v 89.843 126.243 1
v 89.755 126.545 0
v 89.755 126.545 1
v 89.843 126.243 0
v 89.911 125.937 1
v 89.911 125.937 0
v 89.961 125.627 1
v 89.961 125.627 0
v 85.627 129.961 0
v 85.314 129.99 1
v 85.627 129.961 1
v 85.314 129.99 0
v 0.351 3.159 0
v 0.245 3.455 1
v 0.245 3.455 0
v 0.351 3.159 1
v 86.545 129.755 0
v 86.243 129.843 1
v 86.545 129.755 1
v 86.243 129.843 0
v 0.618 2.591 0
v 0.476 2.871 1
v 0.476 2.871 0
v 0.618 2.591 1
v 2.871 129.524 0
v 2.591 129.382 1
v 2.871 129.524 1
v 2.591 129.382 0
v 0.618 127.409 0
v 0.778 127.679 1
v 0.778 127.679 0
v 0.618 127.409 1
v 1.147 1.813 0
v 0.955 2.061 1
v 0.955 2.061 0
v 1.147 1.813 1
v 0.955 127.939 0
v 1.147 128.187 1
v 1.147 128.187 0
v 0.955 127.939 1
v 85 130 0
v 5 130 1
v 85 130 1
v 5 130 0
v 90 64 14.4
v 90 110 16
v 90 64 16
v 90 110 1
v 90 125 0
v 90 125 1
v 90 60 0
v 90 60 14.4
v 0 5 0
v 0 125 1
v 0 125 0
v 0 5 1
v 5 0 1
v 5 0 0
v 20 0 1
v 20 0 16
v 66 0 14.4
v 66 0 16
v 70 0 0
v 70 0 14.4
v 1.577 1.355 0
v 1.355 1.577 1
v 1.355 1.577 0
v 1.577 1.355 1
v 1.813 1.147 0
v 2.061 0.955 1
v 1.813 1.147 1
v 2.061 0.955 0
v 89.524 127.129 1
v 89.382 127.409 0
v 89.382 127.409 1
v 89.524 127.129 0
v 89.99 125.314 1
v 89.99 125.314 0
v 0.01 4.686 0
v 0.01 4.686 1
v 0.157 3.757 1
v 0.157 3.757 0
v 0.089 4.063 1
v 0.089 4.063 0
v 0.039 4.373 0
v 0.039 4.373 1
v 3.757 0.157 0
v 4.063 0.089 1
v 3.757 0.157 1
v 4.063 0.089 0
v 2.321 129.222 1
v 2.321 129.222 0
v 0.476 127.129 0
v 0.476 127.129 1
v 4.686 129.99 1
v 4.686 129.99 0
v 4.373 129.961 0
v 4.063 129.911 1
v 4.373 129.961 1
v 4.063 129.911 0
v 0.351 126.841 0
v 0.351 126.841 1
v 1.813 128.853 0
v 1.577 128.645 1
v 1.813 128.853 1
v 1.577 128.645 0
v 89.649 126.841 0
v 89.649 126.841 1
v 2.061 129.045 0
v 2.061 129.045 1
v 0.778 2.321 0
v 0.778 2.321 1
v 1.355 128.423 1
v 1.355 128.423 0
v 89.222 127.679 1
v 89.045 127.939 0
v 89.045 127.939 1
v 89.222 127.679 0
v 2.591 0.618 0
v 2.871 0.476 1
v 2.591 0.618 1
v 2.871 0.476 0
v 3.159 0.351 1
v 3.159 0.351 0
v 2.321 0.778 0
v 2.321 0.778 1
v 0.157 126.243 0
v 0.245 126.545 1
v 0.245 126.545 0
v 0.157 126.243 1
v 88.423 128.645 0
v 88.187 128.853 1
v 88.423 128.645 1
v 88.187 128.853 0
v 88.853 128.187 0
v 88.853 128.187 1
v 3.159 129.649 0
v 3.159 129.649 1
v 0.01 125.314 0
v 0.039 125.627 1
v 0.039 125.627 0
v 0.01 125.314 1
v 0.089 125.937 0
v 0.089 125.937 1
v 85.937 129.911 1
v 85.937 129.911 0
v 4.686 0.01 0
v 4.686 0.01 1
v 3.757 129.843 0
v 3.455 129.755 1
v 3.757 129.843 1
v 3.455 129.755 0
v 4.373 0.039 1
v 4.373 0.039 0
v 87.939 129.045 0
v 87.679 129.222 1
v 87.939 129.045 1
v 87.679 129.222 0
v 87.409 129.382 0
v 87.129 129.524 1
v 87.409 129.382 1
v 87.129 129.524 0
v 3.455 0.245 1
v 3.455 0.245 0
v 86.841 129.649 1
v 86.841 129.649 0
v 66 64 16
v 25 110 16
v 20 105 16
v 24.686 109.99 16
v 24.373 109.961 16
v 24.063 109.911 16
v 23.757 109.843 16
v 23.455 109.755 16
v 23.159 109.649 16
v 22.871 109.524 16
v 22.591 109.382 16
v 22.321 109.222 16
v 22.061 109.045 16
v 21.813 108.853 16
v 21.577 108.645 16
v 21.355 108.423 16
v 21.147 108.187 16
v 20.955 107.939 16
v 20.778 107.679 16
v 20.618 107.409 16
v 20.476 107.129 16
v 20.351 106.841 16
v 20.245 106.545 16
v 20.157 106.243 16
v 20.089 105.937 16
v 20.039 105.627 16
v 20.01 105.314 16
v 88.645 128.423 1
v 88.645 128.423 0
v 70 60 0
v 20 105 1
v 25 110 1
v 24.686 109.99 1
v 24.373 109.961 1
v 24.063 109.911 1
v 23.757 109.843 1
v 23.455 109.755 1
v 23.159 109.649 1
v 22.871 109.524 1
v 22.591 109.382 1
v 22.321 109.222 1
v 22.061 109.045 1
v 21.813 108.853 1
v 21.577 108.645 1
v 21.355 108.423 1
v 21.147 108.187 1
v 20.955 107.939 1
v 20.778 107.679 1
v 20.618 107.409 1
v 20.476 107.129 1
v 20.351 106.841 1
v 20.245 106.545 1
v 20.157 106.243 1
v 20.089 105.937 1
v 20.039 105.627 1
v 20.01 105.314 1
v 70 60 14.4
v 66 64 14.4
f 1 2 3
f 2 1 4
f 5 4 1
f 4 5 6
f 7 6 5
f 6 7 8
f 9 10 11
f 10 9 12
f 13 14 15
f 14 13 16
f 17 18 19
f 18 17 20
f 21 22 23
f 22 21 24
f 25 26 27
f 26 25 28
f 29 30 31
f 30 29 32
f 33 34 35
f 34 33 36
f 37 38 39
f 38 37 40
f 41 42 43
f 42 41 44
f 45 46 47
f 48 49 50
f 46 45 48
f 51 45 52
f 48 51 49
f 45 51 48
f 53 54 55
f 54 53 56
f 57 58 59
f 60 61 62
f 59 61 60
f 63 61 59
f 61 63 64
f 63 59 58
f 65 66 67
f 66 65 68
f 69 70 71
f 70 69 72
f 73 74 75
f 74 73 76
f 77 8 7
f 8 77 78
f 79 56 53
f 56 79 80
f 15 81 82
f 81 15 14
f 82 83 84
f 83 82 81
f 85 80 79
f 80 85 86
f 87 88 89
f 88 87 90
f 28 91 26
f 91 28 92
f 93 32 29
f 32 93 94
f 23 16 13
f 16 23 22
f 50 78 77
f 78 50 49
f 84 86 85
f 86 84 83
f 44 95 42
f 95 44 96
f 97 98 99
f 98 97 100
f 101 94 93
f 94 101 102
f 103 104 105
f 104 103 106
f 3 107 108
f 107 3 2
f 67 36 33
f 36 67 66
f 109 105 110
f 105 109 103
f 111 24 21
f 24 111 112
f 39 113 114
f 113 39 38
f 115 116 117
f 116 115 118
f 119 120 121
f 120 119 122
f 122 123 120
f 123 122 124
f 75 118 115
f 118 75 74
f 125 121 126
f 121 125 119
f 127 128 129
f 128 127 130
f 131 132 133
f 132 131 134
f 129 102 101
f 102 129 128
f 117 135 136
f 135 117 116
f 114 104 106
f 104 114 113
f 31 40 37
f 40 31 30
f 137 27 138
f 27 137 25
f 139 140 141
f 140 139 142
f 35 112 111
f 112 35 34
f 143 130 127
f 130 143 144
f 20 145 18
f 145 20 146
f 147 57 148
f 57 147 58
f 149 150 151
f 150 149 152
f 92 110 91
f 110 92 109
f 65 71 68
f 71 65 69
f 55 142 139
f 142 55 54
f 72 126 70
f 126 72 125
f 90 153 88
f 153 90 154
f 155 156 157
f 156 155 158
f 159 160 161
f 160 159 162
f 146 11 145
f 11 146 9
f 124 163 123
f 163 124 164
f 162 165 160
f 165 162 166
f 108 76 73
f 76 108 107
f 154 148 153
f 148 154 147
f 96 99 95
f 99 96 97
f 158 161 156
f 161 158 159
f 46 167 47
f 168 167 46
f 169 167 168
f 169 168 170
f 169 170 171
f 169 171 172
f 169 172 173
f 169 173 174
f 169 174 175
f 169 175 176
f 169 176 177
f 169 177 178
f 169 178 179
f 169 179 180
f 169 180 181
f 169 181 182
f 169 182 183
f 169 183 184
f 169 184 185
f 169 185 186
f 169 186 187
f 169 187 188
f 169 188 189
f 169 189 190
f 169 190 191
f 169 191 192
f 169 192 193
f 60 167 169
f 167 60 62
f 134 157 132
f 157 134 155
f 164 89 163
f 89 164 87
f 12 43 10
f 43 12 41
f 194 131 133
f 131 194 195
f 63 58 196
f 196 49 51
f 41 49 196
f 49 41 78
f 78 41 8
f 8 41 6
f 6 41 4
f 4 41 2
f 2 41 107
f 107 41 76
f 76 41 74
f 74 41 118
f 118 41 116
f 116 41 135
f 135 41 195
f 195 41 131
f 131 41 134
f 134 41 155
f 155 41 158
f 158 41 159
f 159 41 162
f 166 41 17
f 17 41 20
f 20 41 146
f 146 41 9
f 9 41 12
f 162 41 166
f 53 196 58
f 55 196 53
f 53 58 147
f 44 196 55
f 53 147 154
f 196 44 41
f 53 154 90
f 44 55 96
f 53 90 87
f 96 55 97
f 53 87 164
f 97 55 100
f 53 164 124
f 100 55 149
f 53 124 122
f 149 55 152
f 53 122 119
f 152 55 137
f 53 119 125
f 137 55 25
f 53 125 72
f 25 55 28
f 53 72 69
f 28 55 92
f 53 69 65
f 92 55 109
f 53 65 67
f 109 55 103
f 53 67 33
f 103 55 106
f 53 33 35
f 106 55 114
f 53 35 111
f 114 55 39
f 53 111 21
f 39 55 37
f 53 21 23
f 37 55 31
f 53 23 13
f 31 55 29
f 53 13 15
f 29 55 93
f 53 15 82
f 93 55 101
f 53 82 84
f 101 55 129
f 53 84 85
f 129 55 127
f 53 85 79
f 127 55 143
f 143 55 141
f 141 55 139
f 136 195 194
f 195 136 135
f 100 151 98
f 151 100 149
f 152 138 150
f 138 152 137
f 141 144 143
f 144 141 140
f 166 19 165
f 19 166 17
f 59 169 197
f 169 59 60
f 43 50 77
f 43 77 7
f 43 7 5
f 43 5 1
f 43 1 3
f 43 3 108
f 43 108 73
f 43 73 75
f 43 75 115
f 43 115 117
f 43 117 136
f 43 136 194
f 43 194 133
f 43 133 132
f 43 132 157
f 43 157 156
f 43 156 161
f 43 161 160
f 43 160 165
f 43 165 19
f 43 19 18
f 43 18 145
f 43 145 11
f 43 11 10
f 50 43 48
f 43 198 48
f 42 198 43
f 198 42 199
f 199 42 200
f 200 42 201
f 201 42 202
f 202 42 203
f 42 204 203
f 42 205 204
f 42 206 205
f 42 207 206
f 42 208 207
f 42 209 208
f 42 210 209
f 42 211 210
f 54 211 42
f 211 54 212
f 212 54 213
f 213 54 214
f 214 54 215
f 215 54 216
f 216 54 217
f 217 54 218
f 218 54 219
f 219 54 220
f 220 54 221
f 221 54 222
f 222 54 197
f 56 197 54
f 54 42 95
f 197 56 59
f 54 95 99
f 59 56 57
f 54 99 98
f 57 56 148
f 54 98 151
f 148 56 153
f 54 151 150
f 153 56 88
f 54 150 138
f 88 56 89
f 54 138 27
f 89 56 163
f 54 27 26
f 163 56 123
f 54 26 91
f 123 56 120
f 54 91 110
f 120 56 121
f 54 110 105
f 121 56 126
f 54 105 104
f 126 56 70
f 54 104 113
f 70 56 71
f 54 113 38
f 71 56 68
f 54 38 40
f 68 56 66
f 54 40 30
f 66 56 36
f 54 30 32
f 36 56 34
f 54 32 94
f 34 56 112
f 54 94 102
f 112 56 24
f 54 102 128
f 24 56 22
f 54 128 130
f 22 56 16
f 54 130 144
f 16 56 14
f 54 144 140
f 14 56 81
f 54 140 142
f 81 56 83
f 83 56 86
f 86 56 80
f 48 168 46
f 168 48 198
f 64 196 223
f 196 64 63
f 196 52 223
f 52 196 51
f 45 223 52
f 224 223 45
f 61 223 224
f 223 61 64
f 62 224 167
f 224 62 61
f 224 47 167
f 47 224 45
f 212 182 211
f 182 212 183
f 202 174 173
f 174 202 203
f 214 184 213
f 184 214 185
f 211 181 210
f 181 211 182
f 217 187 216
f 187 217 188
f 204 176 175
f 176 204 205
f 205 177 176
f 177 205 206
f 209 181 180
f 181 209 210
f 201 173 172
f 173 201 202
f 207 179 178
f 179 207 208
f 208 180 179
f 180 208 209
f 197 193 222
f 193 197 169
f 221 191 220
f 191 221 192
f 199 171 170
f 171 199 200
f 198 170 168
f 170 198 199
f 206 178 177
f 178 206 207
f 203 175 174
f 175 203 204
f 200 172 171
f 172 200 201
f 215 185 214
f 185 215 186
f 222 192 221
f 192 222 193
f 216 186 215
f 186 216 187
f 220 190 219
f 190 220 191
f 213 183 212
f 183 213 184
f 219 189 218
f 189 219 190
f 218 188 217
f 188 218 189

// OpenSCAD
/*
    A short OpenSCAD script to generate a simple jig to hold a two-sided 
    PCB while solder paste is applied with a stencil.
    
    Customise the variables below and print two jigs, to hold opposite
    corners of the board. Align against the PCB and tape to the bench. 
    Tape the stencil to the platform, apply the solder paste, and repeat 
    as required.
    
    The jig raises the PCB off the bench enough to allow components on 
    the underside of the board to sit clear.
    
    Copyright 2023 Patrick Coleman (https://github.com/blinken)
    Licensed under Creative Commons BY-SA 4.0. To view a copy of this license, visit http://creativecommons.org/licenses/by-sa/4.0/
*/


// set to ~2mm less than the long edge of the PCB panel
y_length=110; // mm

// set to ~2mm less than the short edge of the PCB panel
x_length=70; // mm

// the width of the platform for the stencil - set wide enough that you'll have space to tape
// the stencil
platform=50; // mm

// total height, set slightly more than the tallest component on the 
// bottom of the board
height=16; // mm

// width & thickness of the skirt for taping to the bench
skirt_width=20; // mm
skirt_thickness=1; // mm

// thickness of the PCB (sets the depth of the cutout ledge)
pcb_thickness=1.6; // mm

// width of the ledge - set equal to your PCB rail width, if you have them, or
// otherwise a width around the edges of the board clear of components.
pcb_ledge_width=4; // mm 

// radius for the rounded corners
corner_radius=5; // mm

fudge=1;
union() {
    difference() {
        translate([corner_radius, corner_radius, 0]) {
            linear_extrude(height) {
                minkowski($fn=100) {
                    square([skirt_width+x_length-2*corner_radius,y_length+skirt_width-2*corner_radius]);
                    circle(5);
                }
            }
        }

        translate([-fudge, -fudge, skirt_thickness]) {
            cube([skirt_width+fudge, y_length+skirt_width+2*fudge, height+fudge]);
        }
        translate([-fudge, y_length, skirt_thickness]) {
            cube([skirt_width+x_length+2*fudge, skirt_width+fudge, height+fudge]);
        }
        
        translate([skirt_width-corner_radius, y_length-corner_radius, skirt_thickness]) {
            rotate([0, 0, 0]) {
                cube([corner_radius*2, corner_radius*2, height-skirt_thickness+fudge]);
            }
        }
        
        translate([skirt_width+platform, -fudge, -fudge]) {
            cube([x_length-platform+fudge, y_length-platform+fudge, height+2*fudge]);
        }
        
        translate([skirt_width+platform-pcb_ledge_width, -fudge, height-pcb_thickness]) {
            cube([x_length-platform+pcb_ledge_width+fudge, y_length-platform+pcb_ledge_width+fudge, pcb_thickness+fudge]);
        }
    }

    translate([skirt_width+corner_radius, y_length-corner_radius, skirt_thickness]) {
        cylinder(height-skirt_thickness, corner_radius, corner_radius, $fn=100);
    }
}
